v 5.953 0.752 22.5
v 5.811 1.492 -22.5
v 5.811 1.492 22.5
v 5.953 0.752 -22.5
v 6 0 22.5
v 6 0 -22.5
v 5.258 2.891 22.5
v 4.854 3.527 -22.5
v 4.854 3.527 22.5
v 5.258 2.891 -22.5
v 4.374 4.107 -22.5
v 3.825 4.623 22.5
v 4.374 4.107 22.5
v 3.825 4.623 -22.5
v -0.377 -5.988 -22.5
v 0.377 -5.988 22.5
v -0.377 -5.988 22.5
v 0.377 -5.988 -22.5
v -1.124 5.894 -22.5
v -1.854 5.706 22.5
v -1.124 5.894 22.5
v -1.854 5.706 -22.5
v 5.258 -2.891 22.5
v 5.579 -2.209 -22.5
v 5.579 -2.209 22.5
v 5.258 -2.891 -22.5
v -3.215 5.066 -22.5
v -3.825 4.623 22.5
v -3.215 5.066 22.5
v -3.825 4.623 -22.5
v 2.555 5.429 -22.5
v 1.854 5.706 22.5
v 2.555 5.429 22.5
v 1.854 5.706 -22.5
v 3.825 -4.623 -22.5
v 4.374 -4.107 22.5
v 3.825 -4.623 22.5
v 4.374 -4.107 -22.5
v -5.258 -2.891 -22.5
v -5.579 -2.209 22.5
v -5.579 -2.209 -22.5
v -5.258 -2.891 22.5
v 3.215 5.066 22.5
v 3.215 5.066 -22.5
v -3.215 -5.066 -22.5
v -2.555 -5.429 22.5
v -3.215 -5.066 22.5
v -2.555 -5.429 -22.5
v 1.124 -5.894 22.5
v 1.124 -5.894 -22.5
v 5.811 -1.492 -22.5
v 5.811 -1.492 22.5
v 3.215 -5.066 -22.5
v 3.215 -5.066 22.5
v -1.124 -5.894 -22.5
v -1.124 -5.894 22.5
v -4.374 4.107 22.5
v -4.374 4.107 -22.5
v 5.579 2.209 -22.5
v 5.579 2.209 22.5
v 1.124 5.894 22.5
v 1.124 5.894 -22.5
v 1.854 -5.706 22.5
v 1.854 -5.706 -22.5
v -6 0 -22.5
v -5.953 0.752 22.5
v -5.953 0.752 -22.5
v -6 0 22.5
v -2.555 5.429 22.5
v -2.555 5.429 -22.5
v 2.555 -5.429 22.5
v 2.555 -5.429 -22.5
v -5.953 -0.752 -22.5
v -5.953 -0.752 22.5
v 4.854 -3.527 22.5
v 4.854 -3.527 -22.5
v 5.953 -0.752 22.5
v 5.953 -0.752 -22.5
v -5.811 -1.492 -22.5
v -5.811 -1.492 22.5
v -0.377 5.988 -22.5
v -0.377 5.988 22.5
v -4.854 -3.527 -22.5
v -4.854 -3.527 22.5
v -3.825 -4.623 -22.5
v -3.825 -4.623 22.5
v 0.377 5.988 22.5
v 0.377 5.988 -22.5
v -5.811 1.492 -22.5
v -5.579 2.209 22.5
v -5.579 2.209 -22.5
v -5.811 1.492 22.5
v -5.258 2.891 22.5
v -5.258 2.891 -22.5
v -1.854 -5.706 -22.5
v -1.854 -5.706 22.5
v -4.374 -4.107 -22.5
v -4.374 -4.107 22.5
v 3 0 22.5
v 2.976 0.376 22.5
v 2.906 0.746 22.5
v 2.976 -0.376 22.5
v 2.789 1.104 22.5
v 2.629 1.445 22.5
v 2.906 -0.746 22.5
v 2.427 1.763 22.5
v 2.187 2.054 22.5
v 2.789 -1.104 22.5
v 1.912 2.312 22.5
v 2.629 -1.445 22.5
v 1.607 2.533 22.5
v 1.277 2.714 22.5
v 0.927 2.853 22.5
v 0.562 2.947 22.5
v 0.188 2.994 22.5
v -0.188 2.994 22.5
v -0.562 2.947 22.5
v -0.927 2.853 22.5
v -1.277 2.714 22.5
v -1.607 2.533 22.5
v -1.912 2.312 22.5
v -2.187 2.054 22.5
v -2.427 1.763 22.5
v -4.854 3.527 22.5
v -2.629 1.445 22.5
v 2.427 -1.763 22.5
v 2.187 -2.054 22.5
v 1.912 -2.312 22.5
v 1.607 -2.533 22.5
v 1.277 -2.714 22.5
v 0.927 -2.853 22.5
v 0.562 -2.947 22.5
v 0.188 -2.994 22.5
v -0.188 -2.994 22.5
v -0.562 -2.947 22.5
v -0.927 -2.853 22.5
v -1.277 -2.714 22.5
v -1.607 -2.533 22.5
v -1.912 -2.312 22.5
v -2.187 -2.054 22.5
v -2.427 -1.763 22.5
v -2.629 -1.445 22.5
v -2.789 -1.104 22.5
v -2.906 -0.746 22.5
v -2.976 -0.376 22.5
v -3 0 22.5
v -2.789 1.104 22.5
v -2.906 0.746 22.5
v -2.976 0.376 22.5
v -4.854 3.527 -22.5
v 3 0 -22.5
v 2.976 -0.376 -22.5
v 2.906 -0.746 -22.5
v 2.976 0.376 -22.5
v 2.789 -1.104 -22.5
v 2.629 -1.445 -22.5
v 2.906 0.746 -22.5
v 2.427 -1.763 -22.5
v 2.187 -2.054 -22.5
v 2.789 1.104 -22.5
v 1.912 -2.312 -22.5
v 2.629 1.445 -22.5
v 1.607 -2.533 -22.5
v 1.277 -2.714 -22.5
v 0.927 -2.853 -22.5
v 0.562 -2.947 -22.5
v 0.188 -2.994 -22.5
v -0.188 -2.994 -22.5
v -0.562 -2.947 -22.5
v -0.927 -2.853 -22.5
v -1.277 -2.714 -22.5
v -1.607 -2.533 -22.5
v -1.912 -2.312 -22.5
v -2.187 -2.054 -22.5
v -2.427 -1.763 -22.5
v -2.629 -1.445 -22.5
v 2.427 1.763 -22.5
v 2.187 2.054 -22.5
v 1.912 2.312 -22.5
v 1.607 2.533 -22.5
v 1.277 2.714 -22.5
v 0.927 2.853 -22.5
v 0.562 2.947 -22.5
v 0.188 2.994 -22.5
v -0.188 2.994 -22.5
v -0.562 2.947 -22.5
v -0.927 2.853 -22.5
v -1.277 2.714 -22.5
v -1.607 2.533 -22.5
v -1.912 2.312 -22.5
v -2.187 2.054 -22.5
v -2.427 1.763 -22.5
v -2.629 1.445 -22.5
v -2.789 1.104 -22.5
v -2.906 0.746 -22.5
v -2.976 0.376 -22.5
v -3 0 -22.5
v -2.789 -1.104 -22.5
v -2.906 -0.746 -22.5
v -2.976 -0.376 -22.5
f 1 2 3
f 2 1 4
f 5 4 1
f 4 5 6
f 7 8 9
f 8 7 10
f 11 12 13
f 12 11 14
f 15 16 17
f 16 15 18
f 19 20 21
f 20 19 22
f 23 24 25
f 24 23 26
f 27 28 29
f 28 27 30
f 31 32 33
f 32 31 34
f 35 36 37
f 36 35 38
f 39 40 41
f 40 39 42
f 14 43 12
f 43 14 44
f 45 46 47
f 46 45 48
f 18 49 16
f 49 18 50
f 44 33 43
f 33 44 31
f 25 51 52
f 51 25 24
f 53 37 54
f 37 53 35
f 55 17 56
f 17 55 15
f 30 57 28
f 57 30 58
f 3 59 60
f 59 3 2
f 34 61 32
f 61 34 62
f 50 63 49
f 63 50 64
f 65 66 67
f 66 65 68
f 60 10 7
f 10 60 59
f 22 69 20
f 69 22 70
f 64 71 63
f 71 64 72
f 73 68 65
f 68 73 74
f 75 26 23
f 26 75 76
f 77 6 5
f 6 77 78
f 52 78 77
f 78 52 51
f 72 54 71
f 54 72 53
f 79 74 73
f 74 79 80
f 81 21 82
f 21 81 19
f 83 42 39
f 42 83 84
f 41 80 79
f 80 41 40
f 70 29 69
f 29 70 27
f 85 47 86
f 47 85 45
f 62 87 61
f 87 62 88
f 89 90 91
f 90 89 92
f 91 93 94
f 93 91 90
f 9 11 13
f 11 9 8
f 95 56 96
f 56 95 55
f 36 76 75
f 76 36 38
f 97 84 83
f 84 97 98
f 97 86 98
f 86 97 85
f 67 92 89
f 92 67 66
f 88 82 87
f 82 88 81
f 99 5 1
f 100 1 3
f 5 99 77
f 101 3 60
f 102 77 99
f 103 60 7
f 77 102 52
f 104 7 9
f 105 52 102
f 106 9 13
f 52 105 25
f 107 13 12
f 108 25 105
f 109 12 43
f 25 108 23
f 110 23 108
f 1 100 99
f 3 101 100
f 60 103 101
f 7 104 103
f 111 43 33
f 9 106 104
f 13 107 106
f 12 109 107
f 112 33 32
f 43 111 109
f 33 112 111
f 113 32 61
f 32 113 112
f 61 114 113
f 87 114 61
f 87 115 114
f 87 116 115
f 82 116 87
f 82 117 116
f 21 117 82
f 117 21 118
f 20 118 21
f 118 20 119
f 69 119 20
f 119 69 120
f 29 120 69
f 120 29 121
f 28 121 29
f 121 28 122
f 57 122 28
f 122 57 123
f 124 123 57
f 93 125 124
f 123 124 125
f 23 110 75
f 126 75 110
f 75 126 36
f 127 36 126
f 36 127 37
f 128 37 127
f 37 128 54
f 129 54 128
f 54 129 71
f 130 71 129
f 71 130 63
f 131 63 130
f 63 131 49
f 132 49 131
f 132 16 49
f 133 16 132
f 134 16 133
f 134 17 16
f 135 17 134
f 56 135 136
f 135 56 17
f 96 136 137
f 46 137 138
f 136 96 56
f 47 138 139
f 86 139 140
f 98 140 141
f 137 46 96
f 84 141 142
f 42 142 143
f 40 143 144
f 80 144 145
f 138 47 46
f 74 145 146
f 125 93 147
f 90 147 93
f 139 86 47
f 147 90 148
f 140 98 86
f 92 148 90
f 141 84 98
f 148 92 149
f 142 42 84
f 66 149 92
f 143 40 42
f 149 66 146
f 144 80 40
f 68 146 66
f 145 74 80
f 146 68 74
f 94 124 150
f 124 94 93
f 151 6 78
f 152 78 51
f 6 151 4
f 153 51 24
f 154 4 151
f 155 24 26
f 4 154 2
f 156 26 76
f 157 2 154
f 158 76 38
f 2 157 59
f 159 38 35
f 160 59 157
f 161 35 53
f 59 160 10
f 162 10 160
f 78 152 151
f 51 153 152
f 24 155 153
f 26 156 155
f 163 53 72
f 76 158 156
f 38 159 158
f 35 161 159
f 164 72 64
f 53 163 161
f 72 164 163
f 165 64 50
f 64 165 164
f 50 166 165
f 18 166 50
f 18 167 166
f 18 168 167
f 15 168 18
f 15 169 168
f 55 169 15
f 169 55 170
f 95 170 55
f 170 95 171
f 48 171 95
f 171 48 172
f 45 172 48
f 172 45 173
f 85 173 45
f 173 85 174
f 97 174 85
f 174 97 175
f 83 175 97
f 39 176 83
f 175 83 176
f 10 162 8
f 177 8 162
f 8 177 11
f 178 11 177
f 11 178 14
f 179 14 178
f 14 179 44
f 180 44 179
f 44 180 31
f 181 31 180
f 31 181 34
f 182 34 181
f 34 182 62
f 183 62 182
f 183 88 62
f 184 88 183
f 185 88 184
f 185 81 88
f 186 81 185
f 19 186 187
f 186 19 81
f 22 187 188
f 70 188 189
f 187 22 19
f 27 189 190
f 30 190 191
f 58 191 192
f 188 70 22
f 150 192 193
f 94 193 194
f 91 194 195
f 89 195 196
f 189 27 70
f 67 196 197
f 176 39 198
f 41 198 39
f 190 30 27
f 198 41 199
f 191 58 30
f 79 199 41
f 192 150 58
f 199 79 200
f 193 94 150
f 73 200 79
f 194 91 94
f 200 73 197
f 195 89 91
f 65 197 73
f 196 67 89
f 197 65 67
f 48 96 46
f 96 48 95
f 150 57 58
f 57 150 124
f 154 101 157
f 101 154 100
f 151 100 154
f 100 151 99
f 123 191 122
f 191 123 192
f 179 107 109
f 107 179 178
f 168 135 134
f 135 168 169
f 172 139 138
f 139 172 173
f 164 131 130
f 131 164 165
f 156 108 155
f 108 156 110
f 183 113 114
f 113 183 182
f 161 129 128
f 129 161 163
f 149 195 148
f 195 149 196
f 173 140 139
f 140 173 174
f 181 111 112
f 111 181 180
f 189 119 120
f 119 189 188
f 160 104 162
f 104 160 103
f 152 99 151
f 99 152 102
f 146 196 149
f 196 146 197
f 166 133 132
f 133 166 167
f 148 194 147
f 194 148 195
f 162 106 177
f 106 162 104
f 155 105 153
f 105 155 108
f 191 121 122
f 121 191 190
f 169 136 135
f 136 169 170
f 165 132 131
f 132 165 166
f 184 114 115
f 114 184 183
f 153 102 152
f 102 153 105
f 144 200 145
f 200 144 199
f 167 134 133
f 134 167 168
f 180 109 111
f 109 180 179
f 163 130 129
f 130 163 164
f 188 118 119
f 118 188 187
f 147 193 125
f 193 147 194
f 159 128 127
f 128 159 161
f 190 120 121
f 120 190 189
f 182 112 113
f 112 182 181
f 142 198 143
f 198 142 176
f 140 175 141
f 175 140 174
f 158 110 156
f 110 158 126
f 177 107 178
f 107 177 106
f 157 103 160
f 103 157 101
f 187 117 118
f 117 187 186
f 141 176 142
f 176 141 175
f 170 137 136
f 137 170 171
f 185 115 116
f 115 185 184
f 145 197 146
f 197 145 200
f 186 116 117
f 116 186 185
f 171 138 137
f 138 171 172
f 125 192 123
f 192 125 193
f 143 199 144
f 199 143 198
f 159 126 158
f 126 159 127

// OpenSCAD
$fn = 50;


difference() {
	union() {
		translate(v = [0, 0, -22.5000000000]) {
			cylinder(h = 45, r = 6.0000000000);
		}
	}
	union() {
		translate(v = [0, 0, -100.0000000000]) {
			cylinder(h = 200, r = 3.0000000000);
		}
	}
}
